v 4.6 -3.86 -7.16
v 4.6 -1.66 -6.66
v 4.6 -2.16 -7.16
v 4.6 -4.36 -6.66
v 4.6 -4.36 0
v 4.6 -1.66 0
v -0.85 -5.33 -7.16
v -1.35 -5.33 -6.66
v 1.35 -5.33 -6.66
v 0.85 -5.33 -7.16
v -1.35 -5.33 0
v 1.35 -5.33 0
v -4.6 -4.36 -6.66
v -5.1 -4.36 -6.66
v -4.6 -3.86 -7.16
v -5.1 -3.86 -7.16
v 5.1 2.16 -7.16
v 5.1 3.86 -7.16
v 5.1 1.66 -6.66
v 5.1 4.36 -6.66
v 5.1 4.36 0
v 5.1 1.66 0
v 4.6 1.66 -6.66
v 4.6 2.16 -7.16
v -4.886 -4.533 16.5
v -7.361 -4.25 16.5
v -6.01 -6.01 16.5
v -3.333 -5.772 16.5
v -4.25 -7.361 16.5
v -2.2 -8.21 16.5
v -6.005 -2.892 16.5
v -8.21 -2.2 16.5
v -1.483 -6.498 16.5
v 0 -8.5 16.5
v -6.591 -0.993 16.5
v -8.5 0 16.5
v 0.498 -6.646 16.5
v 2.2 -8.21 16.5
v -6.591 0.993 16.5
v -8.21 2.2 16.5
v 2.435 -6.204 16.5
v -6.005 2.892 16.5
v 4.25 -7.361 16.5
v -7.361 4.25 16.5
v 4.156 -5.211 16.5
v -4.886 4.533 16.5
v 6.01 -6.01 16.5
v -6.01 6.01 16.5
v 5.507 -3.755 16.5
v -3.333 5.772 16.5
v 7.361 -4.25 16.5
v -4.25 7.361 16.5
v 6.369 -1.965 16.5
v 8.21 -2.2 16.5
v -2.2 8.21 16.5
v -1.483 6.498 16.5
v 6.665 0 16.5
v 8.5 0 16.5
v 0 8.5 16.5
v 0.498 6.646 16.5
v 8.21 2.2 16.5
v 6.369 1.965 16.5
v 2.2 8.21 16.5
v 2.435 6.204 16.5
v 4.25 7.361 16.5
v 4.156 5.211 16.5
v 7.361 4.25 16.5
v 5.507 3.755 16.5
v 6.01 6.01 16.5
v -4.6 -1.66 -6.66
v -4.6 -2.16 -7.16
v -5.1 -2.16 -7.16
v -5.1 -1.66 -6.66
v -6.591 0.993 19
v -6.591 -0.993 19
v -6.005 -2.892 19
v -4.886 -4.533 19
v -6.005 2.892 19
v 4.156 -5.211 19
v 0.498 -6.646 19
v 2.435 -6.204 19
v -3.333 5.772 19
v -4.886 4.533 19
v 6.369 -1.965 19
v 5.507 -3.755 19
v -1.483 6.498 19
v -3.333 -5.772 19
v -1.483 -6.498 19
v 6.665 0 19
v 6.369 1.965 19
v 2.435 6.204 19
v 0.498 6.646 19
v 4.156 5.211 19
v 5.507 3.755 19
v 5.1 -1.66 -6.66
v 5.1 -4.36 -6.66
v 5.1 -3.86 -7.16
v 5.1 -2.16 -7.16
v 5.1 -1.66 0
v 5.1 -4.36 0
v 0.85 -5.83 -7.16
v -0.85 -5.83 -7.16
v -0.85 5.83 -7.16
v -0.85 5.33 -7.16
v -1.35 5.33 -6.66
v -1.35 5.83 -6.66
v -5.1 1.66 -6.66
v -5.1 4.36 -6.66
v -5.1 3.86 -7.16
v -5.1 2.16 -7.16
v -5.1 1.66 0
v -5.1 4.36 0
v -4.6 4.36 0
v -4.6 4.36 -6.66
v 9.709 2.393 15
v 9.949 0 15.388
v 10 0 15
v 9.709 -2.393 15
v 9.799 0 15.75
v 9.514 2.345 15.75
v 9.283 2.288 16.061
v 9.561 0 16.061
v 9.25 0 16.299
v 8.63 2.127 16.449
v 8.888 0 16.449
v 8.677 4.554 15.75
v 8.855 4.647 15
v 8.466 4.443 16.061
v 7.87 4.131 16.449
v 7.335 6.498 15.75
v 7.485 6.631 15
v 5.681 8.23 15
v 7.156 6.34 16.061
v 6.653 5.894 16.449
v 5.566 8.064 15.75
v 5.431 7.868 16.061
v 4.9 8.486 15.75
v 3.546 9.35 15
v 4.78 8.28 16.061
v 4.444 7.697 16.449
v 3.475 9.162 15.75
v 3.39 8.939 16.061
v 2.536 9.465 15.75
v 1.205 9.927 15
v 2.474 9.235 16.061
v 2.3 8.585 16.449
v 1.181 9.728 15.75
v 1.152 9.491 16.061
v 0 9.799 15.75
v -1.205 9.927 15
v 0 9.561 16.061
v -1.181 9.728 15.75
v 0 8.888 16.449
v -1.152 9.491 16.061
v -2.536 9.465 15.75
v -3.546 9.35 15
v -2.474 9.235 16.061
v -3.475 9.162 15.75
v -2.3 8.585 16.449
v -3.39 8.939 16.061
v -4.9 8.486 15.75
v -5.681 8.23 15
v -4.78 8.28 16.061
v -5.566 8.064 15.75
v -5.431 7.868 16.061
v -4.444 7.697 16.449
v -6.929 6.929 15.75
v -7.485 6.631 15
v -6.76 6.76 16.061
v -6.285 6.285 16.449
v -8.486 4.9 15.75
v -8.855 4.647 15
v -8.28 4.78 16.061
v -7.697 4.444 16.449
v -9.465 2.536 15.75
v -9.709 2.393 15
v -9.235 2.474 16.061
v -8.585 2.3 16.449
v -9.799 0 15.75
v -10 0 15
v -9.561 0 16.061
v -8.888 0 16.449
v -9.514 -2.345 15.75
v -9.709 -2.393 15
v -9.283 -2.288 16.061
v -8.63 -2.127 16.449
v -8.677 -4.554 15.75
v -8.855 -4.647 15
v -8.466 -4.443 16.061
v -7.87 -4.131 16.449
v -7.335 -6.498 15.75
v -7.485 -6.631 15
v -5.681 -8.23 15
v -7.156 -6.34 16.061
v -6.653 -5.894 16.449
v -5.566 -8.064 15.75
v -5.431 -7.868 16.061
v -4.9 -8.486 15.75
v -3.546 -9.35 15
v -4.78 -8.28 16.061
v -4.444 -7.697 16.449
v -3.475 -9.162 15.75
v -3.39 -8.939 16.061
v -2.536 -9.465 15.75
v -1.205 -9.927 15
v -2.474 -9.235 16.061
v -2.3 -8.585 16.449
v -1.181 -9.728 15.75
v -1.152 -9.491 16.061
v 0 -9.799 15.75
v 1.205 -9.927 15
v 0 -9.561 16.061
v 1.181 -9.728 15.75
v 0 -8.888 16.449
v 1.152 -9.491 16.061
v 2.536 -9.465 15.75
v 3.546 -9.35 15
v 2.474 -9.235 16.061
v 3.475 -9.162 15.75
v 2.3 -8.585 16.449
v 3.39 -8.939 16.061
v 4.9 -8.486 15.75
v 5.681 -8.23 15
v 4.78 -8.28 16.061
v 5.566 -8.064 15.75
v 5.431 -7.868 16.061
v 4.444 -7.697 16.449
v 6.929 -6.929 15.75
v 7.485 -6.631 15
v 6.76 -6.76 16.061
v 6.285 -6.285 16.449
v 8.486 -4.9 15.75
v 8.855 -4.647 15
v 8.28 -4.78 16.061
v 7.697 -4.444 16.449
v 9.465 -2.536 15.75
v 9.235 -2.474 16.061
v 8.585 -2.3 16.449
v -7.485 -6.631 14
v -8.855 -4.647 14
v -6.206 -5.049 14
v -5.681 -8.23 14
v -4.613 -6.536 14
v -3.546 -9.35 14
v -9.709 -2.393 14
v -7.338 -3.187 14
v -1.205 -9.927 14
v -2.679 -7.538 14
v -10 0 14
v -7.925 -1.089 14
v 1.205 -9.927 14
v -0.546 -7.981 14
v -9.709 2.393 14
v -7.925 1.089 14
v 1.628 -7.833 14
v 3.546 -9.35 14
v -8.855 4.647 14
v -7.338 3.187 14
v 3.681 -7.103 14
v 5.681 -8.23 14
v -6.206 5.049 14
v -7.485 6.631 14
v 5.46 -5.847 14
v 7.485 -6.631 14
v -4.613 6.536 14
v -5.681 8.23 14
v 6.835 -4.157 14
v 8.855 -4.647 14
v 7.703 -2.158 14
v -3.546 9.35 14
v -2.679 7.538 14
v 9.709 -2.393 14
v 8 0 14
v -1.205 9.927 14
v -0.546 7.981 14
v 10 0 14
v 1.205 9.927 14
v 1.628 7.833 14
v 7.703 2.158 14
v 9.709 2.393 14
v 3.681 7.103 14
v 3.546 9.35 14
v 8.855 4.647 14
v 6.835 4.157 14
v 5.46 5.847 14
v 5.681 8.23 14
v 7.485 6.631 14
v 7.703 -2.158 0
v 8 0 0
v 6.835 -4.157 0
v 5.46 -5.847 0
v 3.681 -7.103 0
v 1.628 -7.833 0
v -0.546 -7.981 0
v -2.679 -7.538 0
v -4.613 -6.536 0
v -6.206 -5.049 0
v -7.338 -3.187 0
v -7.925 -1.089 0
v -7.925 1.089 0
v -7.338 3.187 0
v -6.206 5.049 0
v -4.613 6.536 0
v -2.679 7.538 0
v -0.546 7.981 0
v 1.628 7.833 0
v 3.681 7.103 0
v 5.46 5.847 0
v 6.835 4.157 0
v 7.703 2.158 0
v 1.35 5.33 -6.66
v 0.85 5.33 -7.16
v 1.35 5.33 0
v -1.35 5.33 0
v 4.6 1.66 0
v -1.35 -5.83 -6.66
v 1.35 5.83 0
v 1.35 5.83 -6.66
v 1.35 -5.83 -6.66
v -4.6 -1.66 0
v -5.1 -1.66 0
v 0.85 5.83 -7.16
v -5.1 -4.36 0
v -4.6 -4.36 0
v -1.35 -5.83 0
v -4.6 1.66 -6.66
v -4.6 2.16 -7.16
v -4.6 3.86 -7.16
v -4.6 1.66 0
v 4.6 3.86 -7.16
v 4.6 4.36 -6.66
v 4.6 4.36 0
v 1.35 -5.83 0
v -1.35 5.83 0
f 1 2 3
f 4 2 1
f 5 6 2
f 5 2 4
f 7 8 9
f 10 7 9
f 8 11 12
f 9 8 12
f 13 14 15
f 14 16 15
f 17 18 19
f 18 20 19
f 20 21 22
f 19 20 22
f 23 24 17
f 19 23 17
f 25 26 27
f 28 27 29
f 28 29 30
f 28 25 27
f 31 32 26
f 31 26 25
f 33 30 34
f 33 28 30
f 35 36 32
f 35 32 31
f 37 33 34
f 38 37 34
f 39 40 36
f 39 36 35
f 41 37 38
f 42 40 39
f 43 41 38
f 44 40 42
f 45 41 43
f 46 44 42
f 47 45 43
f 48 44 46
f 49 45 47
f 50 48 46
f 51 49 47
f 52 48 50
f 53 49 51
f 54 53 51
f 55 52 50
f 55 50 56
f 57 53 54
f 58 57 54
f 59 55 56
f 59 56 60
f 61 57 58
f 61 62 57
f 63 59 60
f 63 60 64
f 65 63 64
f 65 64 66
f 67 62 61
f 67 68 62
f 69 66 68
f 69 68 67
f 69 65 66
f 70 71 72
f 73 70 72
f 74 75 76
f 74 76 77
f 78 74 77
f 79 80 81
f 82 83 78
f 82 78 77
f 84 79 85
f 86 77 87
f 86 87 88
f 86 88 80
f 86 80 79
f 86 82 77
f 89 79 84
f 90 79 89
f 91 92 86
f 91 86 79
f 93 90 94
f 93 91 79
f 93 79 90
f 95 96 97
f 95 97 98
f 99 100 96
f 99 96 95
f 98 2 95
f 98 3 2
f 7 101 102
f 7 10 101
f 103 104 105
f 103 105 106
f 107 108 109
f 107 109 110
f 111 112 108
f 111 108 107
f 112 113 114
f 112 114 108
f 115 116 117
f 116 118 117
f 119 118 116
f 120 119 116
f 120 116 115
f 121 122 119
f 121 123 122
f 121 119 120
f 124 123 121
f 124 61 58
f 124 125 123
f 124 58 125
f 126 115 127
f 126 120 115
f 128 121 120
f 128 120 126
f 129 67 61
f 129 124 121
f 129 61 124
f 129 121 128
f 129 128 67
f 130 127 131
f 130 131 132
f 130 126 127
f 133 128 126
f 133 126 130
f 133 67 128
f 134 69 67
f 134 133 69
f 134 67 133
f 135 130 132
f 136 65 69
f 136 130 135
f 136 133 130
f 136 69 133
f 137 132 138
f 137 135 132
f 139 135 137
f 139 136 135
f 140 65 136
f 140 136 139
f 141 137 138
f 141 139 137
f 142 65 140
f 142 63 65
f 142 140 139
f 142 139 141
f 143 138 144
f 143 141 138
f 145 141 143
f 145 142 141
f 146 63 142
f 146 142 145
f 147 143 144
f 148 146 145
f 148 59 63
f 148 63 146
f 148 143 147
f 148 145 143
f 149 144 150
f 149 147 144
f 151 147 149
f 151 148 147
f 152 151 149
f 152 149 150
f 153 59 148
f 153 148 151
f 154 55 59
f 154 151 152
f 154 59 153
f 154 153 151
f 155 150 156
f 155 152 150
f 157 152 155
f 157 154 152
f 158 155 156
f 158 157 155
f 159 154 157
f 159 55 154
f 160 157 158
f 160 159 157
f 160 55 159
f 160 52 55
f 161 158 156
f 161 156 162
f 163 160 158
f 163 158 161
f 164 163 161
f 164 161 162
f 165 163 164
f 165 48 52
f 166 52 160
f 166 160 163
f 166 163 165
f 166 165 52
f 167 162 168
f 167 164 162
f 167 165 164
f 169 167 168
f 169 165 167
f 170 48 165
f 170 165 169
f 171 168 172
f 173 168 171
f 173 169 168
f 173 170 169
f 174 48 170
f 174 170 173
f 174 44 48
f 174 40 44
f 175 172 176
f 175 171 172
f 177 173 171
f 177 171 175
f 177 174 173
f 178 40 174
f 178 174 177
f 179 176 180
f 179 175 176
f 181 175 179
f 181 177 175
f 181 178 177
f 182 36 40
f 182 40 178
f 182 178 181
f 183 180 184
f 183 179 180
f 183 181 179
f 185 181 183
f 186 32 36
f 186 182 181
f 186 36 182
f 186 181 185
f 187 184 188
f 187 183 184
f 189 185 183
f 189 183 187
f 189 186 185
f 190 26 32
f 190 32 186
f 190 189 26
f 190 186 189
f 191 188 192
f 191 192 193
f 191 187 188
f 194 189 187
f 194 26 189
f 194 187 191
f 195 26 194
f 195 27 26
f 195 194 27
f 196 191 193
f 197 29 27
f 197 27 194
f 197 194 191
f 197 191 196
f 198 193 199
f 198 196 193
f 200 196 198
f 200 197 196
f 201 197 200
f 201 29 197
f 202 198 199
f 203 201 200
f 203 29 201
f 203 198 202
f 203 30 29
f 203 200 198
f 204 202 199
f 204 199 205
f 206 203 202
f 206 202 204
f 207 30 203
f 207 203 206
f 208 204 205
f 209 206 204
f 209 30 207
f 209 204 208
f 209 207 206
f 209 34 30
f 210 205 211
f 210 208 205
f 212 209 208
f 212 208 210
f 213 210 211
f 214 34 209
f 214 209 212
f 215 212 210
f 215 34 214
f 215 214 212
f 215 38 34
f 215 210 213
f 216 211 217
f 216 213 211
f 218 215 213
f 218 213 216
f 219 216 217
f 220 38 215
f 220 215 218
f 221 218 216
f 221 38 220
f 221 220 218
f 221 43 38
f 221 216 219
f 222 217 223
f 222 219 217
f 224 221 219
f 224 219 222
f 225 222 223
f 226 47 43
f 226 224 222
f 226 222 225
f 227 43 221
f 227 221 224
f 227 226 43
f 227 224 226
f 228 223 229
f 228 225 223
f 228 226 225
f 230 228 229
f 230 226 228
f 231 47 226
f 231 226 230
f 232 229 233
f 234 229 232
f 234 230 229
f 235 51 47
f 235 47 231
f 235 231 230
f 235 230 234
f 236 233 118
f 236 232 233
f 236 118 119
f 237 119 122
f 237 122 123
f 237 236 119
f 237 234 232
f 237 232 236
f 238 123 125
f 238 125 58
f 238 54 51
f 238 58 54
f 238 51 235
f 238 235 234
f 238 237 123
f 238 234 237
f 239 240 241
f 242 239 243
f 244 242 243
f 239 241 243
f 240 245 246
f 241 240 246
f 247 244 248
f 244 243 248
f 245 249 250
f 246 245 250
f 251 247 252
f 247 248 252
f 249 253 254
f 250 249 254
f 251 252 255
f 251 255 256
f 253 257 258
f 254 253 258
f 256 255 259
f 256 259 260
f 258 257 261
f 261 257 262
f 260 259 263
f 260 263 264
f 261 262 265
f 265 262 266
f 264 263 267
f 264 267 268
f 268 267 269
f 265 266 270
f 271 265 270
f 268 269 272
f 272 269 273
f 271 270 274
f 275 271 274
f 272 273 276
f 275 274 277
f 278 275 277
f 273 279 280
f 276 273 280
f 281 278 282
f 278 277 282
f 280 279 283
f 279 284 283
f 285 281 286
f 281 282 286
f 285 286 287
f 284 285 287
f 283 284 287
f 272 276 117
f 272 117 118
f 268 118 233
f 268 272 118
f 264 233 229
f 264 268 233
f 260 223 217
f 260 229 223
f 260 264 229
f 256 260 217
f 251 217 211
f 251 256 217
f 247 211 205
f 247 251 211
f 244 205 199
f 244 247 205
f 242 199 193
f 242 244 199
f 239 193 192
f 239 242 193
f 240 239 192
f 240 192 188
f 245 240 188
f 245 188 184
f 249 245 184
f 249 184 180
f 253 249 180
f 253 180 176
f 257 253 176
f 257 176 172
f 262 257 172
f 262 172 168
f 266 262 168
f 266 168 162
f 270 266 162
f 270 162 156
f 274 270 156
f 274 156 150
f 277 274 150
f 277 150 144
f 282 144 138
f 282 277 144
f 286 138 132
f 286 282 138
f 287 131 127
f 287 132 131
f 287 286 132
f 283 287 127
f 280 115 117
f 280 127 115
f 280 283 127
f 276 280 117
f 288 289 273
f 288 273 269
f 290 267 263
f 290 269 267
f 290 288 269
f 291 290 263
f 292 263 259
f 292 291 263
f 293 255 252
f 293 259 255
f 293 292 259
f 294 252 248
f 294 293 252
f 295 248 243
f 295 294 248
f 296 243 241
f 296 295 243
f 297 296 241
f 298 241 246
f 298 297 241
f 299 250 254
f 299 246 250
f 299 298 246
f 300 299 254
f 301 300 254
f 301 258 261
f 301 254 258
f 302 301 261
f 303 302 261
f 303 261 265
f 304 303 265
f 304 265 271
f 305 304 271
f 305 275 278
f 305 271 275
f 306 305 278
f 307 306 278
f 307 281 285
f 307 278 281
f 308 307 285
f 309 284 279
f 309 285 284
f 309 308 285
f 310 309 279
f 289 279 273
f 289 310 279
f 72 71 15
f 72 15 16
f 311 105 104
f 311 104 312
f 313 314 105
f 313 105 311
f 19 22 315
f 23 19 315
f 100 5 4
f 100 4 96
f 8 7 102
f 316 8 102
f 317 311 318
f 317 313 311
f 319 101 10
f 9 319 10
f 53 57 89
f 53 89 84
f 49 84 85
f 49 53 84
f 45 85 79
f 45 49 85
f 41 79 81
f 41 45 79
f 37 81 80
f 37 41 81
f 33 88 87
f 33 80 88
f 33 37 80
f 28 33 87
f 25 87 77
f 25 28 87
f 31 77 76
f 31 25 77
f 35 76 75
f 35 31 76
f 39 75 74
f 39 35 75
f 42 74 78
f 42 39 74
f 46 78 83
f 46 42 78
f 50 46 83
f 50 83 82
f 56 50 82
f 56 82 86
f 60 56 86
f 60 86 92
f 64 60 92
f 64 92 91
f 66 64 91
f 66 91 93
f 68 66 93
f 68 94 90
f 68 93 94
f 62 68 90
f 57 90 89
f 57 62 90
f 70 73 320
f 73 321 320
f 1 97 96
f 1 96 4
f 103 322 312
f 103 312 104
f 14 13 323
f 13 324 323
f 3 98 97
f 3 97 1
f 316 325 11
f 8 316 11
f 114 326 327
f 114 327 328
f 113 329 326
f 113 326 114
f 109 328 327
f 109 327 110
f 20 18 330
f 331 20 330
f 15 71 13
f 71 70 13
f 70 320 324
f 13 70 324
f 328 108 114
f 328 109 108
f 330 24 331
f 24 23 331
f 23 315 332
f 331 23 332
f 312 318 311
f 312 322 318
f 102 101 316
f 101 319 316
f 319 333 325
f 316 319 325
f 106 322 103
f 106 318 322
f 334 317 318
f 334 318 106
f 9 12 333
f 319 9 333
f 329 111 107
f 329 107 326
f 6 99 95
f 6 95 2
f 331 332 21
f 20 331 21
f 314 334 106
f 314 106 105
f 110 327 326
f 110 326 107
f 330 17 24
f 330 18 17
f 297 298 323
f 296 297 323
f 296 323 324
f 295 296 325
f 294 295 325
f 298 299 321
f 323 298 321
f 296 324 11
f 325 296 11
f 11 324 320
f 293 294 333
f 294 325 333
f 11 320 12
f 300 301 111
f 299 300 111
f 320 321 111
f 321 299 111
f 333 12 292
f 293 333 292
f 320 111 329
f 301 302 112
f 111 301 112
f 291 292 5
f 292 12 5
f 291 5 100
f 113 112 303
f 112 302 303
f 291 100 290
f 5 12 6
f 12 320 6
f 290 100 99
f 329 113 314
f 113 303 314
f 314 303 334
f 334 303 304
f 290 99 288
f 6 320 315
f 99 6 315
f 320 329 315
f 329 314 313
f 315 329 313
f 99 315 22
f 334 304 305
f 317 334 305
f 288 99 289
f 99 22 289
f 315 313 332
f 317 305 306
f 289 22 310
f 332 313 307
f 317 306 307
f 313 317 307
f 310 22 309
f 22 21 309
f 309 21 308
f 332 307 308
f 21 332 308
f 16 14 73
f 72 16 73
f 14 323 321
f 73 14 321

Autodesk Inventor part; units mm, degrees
ref_plane "YZ Plane" through (0, 0, 0) normal (1, 0, 0) x (0, 1, 0)
ref_plane "XZ Plane" through (0, 0, 0) normal (0, 1, 0) x (-1, 0, 0)
ref_plane "XY Plane" through (0, 0, 0) normal (0, 0, 1) x (1, 0, 0)
sketch "スケッチ1" plane through (0, 0, 0) normal (0, 0, 1) x (1, 0, 0)
  circle A0 centre (0, 0) radius 8
  dimension "d0" = 16
extrude "押し出し1" add sketch "スケッチ1" along normal blind 14
sketch "スケッチ2" plane through (0, 0, 14) normal (0, 0, 1) x (1, 0, 0)
  circle A0 centre (0, 0) radius 10
  dimension "d3" = 20
extrude "押し出し2" add sketch "スケッチ2" along normal blind 2.5
fillet "フィレット1" radius 1.5 1 edges at (-10, 0, 16.5)
sketch "スケッチ3" plane through (0, 0, 16.5) normal (0, 0, 1) x (1, 0, 0)
  circle A0 centre (0, 0) radius 6.665
  dimension "d7" = 13.33
extrude "押し出し3" add sketch "スケッチ3" along normal blind 2.5
sketch "スケッチ4" plane through (0, 0, 0) normal (0, 0, -1) x (-1, 0, 0)
  line L0 (-1.35, 5.83) -> (1.35, 5.83)
  line L1 (1.35, 5.83) -> (1.35, 5.33)
  line L2 (1.35, 5.33) -> (-1.35, 5.33)
  line L3 (-1.35, 5.33) -> (-1.35, 5.83)
  line L4 (0, -14) -> (0, 14) projected
  line L5 (14, 0) -> (-14, 0) projected
  line L6 (-1.35, -5.83) -> (1.35, -5.83)
  line L7 (1.35, -5.83) -> (1.35, -5.33)
  line L8 (1.35, -5.33) -> (-1.35, -5.33)
  line L9 (-1.35, -5.33) -> (-1.35, -5.83)
  line L10 (4.6, 4.36) -> (5.1, 4.36)
  line L11 (5.1, 4.36) -> (5.1, 1.66)
  line L12 (5.1, 1.66) -> (4.6, 1.66)
  line L13 (4.6, 1.66) -> (4.6, 4.36)
  line L14 (4.6, -4.36) -> (5.1, -4.36)
  line L15 (5.1, -4.36) -> (5.1, -1.66)
  line L16 (5.1, -1.66) -> (4.6, -1.66)
  line L17 (4.6, -1.66) -> (4.6, -4.36)
  line L18 (-4.6, 4.36) -> (-5.1, 4.36)
  line L19 (-5.1, 4.36) -> (-5.1, 1.66)
  line L20 (-5.1, 1.66) -> (-4.6, 1.66)
  line L21 (-4.6, 1.66) -> (-4.6, 4.36)
  line L22 (-4.6, -1.66) -> (-4.6, -4.36)
  line L23 (-4.6, -4.36) -> (-5.1, -4.36)
  line L24 (-5.1, -4.36) -> (-5.1, -1.66)
  line L25 (-5.1, -1.66) -> (-4.6, -1.66)
  point P0 (0, 0)
  point P1 (0, 5.83)
  point P2 (0, -5.83)
  dimension "d10" = 2.7
  dimension "d11" = 5.83
  dimension "d12" = 0.5
  dimension "d13" = 2.7
  dimension "d14" = 0.5
  dimension "d15" = 4.36
  dimension "d16" = 5.1
extrude "押し出し4" add sketch "スケッチ4" along normal blind 7.16
chamfer "面取り1" distance 0.5 angle 45 12 edges at (-4.85, -4.36, -7.16) (-4.85, -1.66, -7.16) (-4.85, 1.66, -7.16) (-4.85, 4.36, -7.16) (-1.35, 5.58, -7.16) (1.35, 5.58, -7.16) (4.85, 4.36, -7.16) (4.85, 1.66, -7.16) (4.85, -1.66, -7.16) (4.85, -4.36, -7.16) (1.35, -5.58, -7.16) (-1.35, -5.58, -7.16)
equation "\"d13\" = d10"
equation "\"d14\" = d12"
properties part number "switch"
